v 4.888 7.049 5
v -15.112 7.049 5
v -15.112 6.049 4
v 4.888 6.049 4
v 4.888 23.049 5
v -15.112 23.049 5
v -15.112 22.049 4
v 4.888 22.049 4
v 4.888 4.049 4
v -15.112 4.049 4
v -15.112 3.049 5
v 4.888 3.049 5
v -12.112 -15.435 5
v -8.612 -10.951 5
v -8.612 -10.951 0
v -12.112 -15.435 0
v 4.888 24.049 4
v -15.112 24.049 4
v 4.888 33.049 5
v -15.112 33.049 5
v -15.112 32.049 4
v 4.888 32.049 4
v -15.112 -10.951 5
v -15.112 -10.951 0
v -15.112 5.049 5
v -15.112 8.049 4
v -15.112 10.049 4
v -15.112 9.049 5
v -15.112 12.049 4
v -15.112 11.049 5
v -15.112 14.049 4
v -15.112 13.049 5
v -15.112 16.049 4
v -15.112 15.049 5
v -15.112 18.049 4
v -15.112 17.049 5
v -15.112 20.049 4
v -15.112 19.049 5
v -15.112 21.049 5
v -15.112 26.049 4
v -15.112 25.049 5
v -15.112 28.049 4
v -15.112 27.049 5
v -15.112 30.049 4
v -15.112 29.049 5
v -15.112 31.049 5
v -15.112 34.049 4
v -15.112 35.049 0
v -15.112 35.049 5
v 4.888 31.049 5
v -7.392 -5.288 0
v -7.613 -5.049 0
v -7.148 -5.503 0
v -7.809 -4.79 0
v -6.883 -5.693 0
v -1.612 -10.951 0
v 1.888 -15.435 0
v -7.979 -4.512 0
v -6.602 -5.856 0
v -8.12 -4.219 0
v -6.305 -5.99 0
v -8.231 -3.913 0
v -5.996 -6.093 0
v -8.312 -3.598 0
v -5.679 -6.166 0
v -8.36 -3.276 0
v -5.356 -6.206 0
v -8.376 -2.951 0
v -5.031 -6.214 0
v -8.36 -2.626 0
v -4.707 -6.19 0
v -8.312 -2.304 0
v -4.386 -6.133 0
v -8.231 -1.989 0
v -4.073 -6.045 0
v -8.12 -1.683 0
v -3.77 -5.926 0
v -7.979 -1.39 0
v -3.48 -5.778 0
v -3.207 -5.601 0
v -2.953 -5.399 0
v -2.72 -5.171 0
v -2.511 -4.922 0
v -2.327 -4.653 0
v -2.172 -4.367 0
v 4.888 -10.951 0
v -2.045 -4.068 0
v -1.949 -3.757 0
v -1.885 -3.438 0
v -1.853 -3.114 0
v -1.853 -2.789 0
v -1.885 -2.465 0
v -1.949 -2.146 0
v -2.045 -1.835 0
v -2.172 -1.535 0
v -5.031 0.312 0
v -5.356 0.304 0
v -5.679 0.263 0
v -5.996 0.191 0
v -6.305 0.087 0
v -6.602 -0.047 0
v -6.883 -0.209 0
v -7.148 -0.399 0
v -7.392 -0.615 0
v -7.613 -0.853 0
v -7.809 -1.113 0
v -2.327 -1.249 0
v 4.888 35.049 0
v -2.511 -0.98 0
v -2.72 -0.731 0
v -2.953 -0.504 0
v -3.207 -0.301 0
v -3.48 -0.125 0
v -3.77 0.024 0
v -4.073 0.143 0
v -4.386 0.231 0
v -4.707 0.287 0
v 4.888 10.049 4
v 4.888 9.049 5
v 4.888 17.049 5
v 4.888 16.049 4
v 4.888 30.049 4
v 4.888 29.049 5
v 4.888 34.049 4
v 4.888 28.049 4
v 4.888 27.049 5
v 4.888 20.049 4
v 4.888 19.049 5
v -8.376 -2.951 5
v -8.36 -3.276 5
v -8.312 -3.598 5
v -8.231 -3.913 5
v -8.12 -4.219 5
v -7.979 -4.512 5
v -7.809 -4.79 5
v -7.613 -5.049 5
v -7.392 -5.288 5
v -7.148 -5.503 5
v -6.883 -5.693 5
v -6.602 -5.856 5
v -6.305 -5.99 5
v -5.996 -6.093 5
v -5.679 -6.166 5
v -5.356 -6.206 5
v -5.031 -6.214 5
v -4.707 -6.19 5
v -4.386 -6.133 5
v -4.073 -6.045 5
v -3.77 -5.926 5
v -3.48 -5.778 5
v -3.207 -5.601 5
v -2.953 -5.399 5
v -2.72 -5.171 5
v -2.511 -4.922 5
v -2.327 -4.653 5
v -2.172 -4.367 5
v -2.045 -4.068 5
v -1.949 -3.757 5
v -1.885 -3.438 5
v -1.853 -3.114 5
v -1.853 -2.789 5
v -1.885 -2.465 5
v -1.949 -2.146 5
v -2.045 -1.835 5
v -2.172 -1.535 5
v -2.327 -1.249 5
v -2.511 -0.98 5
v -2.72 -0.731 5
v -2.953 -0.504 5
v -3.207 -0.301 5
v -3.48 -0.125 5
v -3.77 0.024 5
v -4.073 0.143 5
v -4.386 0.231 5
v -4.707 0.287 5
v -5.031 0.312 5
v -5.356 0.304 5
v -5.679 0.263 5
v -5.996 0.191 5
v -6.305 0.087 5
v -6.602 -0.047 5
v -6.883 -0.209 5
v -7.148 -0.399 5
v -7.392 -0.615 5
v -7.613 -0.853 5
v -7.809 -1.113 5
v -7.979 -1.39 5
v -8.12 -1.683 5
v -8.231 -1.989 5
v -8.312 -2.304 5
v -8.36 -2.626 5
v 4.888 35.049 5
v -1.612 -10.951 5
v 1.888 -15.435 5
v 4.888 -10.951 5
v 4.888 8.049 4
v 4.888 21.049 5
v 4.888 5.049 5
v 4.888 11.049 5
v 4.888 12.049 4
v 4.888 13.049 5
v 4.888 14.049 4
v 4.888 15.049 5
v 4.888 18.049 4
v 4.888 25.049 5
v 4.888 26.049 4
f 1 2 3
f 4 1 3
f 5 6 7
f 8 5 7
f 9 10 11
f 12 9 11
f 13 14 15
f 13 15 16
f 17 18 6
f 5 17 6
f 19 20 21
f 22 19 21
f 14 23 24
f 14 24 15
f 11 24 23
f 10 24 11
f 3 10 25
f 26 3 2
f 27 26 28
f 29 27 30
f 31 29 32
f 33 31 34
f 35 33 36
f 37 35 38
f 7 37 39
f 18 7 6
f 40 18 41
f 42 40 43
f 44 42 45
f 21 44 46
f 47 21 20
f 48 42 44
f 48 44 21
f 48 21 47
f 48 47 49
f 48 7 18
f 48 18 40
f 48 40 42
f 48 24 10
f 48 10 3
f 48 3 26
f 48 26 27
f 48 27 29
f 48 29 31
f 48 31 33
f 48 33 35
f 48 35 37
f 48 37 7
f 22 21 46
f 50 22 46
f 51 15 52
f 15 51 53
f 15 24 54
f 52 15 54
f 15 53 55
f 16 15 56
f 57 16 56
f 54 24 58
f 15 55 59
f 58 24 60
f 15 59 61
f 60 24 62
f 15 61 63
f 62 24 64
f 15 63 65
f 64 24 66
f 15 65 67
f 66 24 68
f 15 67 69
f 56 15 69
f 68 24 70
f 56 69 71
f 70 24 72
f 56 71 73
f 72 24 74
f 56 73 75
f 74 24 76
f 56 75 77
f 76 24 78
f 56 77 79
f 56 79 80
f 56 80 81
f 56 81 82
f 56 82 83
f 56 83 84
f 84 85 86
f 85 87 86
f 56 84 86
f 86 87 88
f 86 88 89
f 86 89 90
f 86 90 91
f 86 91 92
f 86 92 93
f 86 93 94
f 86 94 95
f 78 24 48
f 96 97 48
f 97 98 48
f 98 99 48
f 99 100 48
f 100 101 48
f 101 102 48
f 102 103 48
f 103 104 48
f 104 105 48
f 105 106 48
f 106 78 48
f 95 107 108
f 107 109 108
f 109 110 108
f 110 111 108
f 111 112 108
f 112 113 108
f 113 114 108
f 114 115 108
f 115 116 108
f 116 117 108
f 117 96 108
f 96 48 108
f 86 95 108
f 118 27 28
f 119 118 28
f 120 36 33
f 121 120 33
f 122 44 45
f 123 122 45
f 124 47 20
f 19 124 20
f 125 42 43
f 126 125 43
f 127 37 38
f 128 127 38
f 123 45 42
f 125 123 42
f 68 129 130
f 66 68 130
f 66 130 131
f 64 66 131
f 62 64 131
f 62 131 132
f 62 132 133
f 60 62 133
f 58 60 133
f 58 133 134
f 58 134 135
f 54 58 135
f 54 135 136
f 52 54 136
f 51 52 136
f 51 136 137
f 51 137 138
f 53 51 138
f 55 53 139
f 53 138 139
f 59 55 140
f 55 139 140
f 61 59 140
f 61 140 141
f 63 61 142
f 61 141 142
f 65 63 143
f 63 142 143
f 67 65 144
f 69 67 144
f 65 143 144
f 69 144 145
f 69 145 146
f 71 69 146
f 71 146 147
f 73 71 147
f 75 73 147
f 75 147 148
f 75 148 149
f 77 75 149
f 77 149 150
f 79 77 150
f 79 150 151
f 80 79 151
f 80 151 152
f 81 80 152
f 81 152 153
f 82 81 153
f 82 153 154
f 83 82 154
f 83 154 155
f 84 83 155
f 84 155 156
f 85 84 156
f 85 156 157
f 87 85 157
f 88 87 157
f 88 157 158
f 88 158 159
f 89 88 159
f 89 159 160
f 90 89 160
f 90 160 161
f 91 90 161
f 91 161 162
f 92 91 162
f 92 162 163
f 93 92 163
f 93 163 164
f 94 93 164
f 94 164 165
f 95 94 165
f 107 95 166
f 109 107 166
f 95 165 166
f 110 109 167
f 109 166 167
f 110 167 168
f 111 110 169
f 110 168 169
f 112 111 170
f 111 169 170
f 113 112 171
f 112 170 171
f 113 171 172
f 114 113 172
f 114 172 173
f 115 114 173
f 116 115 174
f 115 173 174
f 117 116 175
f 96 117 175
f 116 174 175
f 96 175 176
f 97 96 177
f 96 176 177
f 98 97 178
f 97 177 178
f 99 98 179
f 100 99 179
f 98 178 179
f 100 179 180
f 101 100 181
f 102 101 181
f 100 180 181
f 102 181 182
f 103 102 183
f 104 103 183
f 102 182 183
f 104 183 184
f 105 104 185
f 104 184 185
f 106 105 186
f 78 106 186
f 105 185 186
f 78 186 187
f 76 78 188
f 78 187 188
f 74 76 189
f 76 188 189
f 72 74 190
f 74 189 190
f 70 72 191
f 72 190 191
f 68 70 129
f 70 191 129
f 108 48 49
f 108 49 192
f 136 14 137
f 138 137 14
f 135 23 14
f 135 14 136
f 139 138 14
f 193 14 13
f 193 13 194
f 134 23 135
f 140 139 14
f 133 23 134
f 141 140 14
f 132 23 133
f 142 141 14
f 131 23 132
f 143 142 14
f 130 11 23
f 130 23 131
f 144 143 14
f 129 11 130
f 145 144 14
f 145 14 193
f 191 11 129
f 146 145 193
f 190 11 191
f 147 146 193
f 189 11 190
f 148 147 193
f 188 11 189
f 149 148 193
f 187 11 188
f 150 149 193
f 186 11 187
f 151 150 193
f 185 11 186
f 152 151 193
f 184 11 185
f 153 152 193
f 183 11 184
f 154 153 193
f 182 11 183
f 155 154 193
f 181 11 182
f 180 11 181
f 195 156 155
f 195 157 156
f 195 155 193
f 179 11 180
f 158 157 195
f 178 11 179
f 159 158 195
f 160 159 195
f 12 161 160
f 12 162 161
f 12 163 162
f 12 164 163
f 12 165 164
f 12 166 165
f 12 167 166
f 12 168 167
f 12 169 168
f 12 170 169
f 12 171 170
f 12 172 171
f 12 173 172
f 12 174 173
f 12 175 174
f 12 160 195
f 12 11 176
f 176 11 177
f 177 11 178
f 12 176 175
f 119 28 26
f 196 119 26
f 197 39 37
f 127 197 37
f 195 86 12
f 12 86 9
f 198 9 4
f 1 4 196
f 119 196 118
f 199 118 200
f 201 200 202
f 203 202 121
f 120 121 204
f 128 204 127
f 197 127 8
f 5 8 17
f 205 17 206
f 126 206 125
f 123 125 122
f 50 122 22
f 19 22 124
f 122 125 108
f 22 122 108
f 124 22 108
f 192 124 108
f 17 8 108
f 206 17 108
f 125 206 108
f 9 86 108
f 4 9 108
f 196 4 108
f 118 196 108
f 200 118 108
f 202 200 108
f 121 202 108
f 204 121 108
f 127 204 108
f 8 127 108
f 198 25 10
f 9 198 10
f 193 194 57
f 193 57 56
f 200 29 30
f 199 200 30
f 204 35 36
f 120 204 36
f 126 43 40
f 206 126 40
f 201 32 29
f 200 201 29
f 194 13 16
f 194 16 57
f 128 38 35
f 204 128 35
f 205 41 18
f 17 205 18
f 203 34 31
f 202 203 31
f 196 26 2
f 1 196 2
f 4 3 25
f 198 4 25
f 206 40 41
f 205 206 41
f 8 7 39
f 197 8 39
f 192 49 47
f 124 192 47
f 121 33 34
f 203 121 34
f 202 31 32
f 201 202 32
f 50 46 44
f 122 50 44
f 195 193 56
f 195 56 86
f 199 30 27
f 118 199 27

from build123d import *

# Parameters (mm, degrees)
F0_W      = 20
F0_H      = 56
F1_DEPTH  = 5
F2_W      = 20
F2_H      = 10
F3_DEPTH  = 45
F5_D      = 6.528
F7_DEPTH  = 20
F9_DEPTH  = 45
F10_DEPTH = 50.001


with BuildPart() as f1:
    # F0 (on Top) → F1 (new body)
    with BuildSketch(Plane.XY):
        with Locations((-5.1124608144, 7.0487826013)):
            Rectangle(F0_W, F0_H)
    extrude(amount=F1_DEPTH)

    # F2 (on face) → F3 (join)
    with BuildSketch(Plane.XY.offset(5)):
        with Locations((-5.1124608144, -15.9512173987)):
            Rectangle(F2_W, F2_H)
    extrude(amount=F3_DEPTH)

    # F5 (through all)
    with Locations(Plane(origin=(0, 0, 0), x_dir=(1, 0, 0), z_dir=(0, 0, -1))):
        with Locations((-5.1124608144, 2.9512173987)):
            Hole(F5_D / 2)

    # F6 (on face) → F7 (cut, through all)
    with BuildSketch(Plane(origin=(-15.1124608144, 0, 0), x_dir=(0, -1, 0), z_dir=(-1, 0, 0))):
        Polygon((-33.0487826013, 5), (-35.0487826013, 5), (-34.0487826013, 4), align=None)
        Polygon((-31.0487826013, 5), (-33.0487826013, 5), (-32.0487826013, 4), align=None)
        Polygon((-29.0487826013, 5), (-31.0487826013, 5), (-30.0487826013, 4), align=None)
        Polygon((-27.0487826013, 5), (-29.0487826013, 5), (-28.0487826013, 4), align=None)
        Polygon((-25.0487826013, 5), (-27.0487826013, 5), (-26.0487826013, 4), align=None)
        Polygon((-23.0487826013, 5), (-25.0487826013, 5), (-24.0487826013, 4), align=None)
        Polygon((-21.0487826013, 5), (-23.0487826013, 5), (-22.0487826013, 4), align=None)
        Polygon((-19.0487826013, 5), (-21.0487826013, 5), (-20.0487826013, 4), align=None)
        Polygon((-17.0487826013, 5), (-19.0487826013, 5), (-18.0487826013, 4), align=None)
        Polygon((-15.0487826013, 5), (-17.0487826013, 5), (-16.0487826013, 4), align=None)
        Polygon((-13.0487826013, 5), (-15.0487826013, 5), (-14.0487826013, 4), align=None)
        Polygon((-12.0487826013, 4), (-11.0487826013, 5), (-13.0487826013, 5), align=None)
        Polygon((-10.0487826013, 4), (-9.0487826013, 5), (-11.0487826013, 5), align=None)
        Polygon((-8.0487826013, 4), (-7.0487826013, 5), (-9.0487826013, 5), align=None)
        Polygon((-6.0487826013, 4), (-5.0487826013, 5), (-7.0487826013, 5), align=None)
        Polygon((-4.0487826013, 4), (-3.0487826013, 5), (-5.0487826013, 5), align=None)
    extrude(amount=-F7_DEPTH, mode=Mode.SUBTRACT)

    # F8 (on face) → F9 (cut)
    with BuildSketch(Plane.XY.offset(50)):
        Polygon((-1.6124608144, -10.9512173987), (-8.6124608144, -10.9512173987), (-12.1124608144, -15.4354041442), (1.8875391856, -15.4354041442), align=None)
    extrude(amount=-F9_DEPTH, mode=Mode.SUBTRACT)

    # F10 (cut, through all): a face of the model
    f10_faces = [f1.faces().sort_by_distance(p)[0] for p in [
        (-5.1124608144, -16.7236905936, 50),
    ]]
    extrude(f10_faces, amount=-F10_DEPTH, mode=Mode.SUBTRACT)


solid = f1.part
